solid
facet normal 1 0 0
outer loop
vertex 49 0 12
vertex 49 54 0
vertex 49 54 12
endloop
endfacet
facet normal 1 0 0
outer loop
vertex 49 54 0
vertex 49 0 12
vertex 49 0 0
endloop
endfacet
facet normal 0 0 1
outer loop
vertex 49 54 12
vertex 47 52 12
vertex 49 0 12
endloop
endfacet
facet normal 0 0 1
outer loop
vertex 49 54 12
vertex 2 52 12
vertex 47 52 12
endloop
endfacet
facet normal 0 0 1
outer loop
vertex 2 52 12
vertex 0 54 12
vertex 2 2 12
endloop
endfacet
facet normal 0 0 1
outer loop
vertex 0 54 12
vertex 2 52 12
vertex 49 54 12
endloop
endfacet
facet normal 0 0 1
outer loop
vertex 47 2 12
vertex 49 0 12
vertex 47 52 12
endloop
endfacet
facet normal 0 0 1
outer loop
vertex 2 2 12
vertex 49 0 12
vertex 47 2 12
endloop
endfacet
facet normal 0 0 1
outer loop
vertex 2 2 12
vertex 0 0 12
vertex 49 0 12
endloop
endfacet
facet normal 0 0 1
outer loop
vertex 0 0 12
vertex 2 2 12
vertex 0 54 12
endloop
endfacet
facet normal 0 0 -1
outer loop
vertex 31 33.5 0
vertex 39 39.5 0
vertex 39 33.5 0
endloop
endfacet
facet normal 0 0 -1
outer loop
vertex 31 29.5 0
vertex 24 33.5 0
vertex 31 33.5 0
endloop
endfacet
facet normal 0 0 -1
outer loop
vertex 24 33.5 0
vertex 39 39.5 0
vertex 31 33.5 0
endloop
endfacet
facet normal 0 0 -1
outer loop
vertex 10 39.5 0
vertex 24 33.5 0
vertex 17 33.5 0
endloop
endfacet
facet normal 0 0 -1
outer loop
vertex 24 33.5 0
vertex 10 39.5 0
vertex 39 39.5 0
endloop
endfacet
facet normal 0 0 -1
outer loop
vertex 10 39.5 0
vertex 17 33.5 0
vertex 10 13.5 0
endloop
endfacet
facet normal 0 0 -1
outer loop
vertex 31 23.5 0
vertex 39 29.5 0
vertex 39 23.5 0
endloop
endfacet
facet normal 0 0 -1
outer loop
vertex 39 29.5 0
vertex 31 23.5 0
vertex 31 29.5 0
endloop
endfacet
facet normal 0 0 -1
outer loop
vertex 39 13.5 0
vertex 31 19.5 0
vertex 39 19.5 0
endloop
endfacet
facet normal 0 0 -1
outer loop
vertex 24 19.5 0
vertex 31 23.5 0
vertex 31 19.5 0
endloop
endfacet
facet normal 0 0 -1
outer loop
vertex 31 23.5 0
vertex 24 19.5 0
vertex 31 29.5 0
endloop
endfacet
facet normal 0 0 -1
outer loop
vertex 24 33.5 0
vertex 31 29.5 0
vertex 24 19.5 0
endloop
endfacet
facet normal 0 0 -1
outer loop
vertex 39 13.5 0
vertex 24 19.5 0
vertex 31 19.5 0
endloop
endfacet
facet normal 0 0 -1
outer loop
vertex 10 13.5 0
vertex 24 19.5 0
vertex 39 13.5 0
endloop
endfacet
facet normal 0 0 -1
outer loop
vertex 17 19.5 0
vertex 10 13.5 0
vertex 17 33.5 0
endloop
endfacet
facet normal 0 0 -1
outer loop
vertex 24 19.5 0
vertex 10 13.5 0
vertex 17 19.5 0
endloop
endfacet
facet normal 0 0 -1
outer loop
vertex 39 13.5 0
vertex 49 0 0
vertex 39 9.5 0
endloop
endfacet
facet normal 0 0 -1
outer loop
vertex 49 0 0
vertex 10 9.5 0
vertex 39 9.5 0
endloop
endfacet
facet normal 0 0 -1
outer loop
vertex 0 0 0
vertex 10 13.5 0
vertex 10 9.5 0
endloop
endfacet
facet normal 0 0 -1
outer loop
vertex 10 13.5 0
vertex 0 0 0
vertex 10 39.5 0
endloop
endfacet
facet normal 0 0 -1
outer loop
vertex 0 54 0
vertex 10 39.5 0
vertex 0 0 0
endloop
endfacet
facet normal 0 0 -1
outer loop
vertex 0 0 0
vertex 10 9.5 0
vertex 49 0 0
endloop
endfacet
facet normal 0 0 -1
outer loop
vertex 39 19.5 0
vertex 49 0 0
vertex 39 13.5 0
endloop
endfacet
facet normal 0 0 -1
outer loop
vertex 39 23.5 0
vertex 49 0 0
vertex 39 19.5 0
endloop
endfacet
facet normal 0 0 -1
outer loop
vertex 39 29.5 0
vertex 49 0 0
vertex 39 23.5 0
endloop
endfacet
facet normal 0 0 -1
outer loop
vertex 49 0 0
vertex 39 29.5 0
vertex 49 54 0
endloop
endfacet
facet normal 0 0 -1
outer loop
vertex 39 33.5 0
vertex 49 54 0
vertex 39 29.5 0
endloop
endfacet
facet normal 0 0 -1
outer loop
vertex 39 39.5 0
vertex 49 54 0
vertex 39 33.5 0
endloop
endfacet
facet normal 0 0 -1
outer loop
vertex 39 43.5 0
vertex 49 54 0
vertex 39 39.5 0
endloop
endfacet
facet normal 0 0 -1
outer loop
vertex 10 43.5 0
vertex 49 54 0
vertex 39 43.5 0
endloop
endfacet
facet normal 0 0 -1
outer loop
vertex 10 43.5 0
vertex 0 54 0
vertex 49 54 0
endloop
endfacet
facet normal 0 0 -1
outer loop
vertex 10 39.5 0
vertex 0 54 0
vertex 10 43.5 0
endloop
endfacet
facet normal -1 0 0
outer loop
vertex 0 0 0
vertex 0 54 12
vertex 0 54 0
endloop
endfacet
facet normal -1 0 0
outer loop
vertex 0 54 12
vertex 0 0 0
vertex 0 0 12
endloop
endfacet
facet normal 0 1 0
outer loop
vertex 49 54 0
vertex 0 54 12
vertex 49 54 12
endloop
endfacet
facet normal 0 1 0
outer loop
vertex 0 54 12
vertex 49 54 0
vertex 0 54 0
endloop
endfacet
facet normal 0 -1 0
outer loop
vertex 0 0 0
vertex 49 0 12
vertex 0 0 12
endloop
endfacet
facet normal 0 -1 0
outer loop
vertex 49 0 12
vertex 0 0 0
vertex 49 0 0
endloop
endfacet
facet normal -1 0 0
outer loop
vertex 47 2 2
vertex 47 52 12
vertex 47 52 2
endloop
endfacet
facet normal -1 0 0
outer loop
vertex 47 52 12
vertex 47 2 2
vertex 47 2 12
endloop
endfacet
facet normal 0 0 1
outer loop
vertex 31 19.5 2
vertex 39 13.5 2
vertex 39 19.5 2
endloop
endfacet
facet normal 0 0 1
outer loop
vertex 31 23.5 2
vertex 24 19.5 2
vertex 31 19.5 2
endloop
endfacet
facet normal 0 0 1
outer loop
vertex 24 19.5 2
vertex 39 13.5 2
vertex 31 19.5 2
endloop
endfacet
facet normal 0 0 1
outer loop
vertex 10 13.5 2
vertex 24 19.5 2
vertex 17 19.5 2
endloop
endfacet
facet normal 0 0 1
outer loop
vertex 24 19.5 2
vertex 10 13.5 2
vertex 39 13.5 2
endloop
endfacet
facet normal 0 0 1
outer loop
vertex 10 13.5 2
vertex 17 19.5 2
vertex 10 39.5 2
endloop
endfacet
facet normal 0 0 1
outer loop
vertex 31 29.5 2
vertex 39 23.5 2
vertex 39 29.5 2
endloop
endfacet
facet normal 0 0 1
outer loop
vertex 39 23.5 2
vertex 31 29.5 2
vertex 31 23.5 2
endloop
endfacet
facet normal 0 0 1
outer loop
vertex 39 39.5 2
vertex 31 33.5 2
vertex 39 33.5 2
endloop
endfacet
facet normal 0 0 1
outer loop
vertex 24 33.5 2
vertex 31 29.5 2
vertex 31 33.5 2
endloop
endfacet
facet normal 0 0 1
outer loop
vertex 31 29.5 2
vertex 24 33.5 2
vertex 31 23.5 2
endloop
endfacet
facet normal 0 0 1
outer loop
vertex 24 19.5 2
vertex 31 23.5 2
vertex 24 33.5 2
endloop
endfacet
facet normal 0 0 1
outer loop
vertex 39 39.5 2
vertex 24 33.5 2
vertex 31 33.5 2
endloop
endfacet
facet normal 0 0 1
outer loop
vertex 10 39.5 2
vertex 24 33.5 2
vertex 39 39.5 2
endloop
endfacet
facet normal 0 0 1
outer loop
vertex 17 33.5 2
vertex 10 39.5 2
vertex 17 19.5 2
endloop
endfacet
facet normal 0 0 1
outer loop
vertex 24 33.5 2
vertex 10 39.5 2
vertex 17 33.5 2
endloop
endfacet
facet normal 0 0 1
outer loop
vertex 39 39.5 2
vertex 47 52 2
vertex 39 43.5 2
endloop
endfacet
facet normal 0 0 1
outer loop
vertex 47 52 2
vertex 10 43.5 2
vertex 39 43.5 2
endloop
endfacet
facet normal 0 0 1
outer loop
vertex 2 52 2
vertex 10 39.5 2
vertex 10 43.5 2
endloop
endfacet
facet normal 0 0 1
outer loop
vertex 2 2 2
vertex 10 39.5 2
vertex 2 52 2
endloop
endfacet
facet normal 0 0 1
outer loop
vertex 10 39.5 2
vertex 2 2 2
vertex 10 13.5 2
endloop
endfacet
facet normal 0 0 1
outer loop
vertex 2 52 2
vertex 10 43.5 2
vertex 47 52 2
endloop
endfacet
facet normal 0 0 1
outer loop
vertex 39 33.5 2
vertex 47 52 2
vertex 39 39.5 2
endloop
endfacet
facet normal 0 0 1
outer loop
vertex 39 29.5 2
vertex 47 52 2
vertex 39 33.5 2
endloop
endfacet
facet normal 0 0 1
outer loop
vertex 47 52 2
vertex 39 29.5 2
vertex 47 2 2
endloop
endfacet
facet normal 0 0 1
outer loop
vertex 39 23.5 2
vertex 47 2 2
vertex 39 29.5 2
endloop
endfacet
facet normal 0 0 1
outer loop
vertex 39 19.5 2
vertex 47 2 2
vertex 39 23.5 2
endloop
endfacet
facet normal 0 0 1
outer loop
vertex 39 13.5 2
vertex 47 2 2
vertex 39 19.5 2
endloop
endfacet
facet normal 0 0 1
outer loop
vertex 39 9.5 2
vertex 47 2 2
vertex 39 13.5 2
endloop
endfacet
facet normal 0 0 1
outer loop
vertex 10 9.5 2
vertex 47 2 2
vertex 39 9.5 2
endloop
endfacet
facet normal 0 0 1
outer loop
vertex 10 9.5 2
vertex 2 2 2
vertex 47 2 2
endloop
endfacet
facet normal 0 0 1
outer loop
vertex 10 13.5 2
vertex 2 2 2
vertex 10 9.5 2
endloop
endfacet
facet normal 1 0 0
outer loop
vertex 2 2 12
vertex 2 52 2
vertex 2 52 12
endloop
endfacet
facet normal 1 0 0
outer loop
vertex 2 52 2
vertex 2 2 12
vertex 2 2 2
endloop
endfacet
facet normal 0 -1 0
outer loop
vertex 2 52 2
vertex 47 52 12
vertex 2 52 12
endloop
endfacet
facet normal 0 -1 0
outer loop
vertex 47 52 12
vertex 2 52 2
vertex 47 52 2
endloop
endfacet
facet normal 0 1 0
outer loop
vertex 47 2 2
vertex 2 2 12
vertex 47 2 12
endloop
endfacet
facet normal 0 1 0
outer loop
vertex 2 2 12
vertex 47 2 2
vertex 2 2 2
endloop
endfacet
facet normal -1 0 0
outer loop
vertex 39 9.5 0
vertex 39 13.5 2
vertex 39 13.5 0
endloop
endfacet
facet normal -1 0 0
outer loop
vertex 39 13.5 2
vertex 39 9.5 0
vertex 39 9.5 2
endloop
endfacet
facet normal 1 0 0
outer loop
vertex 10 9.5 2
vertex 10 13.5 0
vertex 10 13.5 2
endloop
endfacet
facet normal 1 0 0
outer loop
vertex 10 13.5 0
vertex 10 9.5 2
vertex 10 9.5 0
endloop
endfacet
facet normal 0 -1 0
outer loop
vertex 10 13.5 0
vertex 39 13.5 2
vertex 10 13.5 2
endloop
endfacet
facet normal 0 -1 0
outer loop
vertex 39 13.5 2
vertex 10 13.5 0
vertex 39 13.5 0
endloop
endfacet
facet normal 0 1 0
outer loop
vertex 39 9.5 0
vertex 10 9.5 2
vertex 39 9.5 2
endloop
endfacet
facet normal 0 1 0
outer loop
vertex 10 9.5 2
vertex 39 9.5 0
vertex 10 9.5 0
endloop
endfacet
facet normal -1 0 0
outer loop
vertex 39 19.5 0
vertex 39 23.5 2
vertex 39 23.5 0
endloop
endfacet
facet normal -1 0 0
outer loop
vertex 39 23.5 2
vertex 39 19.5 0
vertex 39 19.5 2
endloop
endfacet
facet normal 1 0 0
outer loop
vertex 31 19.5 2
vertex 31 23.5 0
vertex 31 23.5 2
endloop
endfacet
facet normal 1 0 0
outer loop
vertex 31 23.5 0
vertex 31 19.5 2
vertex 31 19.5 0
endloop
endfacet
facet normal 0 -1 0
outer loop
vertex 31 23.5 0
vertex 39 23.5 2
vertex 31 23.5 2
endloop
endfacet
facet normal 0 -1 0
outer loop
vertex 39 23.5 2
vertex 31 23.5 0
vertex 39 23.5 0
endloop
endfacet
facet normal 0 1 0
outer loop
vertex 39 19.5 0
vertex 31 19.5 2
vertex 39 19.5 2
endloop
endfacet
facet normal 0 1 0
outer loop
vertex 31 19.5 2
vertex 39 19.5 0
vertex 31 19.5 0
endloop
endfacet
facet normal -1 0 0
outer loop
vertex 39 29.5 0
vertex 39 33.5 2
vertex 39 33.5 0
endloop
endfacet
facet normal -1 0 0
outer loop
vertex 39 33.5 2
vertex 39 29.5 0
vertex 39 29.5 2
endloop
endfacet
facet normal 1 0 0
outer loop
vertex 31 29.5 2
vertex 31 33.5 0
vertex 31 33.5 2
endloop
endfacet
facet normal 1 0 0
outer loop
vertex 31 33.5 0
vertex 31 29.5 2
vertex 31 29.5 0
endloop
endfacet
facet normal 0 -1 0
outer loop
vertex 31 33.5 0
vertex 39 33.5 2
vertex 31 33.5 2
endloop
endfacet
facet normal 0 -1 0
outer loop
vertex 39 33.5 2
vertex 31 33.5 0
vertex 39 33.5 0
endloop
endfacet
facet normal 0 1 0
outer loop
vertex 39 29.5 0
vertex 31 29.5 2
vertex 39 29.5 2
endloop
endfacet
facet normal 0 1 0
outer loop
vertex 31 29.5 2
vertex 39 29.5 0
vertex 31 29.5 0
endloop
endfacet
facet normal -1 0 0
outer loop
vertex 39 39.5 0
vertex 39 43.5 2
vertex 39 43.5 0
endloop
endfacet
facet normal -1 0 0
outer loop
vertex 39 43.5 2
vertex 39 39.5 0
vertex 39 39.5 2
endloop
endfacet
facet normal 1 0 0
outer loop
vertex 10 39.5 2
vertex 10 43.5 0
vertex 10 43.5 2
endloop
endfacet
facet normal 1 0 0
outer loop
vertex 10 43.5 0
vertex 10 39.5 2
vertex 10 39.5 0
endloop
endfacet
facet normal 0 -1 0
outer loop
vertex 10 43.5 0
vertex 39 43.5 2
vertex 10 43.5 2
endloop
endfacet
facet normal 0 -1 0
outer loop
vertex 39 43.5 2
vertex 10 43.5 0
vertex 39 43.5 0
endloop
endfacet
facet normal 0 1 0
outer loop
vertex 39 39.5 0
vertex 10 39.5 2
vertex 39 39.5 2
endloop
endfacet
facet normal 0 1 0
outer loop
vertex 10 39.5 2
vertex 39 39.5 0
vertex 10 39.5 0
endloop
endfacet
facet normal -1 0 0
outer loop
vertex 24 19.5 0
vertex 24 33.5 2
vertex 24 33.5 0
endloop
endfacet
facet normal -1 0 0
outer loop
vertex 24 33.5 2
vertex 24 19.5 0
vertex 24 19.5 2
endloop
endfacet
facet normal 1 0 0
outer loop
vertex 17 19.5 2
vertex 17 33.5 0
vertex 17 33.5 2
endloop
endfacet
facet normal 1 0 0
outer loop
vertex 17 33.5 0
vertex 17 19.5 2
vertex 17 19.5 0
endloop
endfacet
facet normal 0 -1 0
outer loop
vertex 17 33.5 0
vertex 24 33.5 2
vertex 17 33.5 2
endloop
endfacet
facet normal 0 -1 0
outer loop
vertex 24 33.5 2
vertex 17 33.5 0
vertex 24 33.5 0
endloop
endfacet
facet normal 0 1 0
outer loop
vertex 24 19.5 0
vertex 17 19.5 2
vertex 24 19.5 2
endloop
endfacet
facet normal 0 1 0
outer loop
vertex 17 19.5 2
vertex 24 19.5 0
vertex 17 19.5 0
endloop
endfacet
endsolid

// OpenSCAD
tolerance = 1;
wall_t = 2;

side = 2; // 1 or 2

if(side == 1){

    difference(){
        cube([44 + tolerance + 2 * wall_t, 49 + tolerance + 2 * wall_t, 10 + wall_t]);
        translate([wall_t, wall_t, wall_t]) cube([44 + tolerance, 49 + tolerance, 10]);
        
        for(i = [0:3]){
            translate([10, 9.5 + i * 10, 0]) cube([44 + tolerance + 2 * wall_t - 20, 4, 4]);
        }
    }
    
} else {

    difference(){
        cube([44 + tolerance + 2 * wall_t, 49 + tolerance + 2 * wall_t, 10 + wall_t]);
        translate([wall_t, wall_t, wall_t]) cube([44 + tolerance, 49 + tolerance, 10]);
        
        translate([10, 9.5, 0]) cube([44 + tolerance + 2 * wall_t - 20, 4, 4]);
        translate([31, 9.5 + 10, 0]) cube([44 + tolerance + 2 * wall_t - 41, 4, 4]);
        translate([31, 9.5 + 20, 0]) cube([44 + tolerance + 2 * wall_t - 41, 4, 4]);
        translate([10, 9.5 + 30, 0]) cube([44 + tolerance + 2 * wall_t - 20, 4, 4]);
        
        
        translate([17, (44 + tolerance + 2 * wall_t) / 2 - 7 + wall_t, -1]) cube([7, 14, 4]);
    }
    
}
